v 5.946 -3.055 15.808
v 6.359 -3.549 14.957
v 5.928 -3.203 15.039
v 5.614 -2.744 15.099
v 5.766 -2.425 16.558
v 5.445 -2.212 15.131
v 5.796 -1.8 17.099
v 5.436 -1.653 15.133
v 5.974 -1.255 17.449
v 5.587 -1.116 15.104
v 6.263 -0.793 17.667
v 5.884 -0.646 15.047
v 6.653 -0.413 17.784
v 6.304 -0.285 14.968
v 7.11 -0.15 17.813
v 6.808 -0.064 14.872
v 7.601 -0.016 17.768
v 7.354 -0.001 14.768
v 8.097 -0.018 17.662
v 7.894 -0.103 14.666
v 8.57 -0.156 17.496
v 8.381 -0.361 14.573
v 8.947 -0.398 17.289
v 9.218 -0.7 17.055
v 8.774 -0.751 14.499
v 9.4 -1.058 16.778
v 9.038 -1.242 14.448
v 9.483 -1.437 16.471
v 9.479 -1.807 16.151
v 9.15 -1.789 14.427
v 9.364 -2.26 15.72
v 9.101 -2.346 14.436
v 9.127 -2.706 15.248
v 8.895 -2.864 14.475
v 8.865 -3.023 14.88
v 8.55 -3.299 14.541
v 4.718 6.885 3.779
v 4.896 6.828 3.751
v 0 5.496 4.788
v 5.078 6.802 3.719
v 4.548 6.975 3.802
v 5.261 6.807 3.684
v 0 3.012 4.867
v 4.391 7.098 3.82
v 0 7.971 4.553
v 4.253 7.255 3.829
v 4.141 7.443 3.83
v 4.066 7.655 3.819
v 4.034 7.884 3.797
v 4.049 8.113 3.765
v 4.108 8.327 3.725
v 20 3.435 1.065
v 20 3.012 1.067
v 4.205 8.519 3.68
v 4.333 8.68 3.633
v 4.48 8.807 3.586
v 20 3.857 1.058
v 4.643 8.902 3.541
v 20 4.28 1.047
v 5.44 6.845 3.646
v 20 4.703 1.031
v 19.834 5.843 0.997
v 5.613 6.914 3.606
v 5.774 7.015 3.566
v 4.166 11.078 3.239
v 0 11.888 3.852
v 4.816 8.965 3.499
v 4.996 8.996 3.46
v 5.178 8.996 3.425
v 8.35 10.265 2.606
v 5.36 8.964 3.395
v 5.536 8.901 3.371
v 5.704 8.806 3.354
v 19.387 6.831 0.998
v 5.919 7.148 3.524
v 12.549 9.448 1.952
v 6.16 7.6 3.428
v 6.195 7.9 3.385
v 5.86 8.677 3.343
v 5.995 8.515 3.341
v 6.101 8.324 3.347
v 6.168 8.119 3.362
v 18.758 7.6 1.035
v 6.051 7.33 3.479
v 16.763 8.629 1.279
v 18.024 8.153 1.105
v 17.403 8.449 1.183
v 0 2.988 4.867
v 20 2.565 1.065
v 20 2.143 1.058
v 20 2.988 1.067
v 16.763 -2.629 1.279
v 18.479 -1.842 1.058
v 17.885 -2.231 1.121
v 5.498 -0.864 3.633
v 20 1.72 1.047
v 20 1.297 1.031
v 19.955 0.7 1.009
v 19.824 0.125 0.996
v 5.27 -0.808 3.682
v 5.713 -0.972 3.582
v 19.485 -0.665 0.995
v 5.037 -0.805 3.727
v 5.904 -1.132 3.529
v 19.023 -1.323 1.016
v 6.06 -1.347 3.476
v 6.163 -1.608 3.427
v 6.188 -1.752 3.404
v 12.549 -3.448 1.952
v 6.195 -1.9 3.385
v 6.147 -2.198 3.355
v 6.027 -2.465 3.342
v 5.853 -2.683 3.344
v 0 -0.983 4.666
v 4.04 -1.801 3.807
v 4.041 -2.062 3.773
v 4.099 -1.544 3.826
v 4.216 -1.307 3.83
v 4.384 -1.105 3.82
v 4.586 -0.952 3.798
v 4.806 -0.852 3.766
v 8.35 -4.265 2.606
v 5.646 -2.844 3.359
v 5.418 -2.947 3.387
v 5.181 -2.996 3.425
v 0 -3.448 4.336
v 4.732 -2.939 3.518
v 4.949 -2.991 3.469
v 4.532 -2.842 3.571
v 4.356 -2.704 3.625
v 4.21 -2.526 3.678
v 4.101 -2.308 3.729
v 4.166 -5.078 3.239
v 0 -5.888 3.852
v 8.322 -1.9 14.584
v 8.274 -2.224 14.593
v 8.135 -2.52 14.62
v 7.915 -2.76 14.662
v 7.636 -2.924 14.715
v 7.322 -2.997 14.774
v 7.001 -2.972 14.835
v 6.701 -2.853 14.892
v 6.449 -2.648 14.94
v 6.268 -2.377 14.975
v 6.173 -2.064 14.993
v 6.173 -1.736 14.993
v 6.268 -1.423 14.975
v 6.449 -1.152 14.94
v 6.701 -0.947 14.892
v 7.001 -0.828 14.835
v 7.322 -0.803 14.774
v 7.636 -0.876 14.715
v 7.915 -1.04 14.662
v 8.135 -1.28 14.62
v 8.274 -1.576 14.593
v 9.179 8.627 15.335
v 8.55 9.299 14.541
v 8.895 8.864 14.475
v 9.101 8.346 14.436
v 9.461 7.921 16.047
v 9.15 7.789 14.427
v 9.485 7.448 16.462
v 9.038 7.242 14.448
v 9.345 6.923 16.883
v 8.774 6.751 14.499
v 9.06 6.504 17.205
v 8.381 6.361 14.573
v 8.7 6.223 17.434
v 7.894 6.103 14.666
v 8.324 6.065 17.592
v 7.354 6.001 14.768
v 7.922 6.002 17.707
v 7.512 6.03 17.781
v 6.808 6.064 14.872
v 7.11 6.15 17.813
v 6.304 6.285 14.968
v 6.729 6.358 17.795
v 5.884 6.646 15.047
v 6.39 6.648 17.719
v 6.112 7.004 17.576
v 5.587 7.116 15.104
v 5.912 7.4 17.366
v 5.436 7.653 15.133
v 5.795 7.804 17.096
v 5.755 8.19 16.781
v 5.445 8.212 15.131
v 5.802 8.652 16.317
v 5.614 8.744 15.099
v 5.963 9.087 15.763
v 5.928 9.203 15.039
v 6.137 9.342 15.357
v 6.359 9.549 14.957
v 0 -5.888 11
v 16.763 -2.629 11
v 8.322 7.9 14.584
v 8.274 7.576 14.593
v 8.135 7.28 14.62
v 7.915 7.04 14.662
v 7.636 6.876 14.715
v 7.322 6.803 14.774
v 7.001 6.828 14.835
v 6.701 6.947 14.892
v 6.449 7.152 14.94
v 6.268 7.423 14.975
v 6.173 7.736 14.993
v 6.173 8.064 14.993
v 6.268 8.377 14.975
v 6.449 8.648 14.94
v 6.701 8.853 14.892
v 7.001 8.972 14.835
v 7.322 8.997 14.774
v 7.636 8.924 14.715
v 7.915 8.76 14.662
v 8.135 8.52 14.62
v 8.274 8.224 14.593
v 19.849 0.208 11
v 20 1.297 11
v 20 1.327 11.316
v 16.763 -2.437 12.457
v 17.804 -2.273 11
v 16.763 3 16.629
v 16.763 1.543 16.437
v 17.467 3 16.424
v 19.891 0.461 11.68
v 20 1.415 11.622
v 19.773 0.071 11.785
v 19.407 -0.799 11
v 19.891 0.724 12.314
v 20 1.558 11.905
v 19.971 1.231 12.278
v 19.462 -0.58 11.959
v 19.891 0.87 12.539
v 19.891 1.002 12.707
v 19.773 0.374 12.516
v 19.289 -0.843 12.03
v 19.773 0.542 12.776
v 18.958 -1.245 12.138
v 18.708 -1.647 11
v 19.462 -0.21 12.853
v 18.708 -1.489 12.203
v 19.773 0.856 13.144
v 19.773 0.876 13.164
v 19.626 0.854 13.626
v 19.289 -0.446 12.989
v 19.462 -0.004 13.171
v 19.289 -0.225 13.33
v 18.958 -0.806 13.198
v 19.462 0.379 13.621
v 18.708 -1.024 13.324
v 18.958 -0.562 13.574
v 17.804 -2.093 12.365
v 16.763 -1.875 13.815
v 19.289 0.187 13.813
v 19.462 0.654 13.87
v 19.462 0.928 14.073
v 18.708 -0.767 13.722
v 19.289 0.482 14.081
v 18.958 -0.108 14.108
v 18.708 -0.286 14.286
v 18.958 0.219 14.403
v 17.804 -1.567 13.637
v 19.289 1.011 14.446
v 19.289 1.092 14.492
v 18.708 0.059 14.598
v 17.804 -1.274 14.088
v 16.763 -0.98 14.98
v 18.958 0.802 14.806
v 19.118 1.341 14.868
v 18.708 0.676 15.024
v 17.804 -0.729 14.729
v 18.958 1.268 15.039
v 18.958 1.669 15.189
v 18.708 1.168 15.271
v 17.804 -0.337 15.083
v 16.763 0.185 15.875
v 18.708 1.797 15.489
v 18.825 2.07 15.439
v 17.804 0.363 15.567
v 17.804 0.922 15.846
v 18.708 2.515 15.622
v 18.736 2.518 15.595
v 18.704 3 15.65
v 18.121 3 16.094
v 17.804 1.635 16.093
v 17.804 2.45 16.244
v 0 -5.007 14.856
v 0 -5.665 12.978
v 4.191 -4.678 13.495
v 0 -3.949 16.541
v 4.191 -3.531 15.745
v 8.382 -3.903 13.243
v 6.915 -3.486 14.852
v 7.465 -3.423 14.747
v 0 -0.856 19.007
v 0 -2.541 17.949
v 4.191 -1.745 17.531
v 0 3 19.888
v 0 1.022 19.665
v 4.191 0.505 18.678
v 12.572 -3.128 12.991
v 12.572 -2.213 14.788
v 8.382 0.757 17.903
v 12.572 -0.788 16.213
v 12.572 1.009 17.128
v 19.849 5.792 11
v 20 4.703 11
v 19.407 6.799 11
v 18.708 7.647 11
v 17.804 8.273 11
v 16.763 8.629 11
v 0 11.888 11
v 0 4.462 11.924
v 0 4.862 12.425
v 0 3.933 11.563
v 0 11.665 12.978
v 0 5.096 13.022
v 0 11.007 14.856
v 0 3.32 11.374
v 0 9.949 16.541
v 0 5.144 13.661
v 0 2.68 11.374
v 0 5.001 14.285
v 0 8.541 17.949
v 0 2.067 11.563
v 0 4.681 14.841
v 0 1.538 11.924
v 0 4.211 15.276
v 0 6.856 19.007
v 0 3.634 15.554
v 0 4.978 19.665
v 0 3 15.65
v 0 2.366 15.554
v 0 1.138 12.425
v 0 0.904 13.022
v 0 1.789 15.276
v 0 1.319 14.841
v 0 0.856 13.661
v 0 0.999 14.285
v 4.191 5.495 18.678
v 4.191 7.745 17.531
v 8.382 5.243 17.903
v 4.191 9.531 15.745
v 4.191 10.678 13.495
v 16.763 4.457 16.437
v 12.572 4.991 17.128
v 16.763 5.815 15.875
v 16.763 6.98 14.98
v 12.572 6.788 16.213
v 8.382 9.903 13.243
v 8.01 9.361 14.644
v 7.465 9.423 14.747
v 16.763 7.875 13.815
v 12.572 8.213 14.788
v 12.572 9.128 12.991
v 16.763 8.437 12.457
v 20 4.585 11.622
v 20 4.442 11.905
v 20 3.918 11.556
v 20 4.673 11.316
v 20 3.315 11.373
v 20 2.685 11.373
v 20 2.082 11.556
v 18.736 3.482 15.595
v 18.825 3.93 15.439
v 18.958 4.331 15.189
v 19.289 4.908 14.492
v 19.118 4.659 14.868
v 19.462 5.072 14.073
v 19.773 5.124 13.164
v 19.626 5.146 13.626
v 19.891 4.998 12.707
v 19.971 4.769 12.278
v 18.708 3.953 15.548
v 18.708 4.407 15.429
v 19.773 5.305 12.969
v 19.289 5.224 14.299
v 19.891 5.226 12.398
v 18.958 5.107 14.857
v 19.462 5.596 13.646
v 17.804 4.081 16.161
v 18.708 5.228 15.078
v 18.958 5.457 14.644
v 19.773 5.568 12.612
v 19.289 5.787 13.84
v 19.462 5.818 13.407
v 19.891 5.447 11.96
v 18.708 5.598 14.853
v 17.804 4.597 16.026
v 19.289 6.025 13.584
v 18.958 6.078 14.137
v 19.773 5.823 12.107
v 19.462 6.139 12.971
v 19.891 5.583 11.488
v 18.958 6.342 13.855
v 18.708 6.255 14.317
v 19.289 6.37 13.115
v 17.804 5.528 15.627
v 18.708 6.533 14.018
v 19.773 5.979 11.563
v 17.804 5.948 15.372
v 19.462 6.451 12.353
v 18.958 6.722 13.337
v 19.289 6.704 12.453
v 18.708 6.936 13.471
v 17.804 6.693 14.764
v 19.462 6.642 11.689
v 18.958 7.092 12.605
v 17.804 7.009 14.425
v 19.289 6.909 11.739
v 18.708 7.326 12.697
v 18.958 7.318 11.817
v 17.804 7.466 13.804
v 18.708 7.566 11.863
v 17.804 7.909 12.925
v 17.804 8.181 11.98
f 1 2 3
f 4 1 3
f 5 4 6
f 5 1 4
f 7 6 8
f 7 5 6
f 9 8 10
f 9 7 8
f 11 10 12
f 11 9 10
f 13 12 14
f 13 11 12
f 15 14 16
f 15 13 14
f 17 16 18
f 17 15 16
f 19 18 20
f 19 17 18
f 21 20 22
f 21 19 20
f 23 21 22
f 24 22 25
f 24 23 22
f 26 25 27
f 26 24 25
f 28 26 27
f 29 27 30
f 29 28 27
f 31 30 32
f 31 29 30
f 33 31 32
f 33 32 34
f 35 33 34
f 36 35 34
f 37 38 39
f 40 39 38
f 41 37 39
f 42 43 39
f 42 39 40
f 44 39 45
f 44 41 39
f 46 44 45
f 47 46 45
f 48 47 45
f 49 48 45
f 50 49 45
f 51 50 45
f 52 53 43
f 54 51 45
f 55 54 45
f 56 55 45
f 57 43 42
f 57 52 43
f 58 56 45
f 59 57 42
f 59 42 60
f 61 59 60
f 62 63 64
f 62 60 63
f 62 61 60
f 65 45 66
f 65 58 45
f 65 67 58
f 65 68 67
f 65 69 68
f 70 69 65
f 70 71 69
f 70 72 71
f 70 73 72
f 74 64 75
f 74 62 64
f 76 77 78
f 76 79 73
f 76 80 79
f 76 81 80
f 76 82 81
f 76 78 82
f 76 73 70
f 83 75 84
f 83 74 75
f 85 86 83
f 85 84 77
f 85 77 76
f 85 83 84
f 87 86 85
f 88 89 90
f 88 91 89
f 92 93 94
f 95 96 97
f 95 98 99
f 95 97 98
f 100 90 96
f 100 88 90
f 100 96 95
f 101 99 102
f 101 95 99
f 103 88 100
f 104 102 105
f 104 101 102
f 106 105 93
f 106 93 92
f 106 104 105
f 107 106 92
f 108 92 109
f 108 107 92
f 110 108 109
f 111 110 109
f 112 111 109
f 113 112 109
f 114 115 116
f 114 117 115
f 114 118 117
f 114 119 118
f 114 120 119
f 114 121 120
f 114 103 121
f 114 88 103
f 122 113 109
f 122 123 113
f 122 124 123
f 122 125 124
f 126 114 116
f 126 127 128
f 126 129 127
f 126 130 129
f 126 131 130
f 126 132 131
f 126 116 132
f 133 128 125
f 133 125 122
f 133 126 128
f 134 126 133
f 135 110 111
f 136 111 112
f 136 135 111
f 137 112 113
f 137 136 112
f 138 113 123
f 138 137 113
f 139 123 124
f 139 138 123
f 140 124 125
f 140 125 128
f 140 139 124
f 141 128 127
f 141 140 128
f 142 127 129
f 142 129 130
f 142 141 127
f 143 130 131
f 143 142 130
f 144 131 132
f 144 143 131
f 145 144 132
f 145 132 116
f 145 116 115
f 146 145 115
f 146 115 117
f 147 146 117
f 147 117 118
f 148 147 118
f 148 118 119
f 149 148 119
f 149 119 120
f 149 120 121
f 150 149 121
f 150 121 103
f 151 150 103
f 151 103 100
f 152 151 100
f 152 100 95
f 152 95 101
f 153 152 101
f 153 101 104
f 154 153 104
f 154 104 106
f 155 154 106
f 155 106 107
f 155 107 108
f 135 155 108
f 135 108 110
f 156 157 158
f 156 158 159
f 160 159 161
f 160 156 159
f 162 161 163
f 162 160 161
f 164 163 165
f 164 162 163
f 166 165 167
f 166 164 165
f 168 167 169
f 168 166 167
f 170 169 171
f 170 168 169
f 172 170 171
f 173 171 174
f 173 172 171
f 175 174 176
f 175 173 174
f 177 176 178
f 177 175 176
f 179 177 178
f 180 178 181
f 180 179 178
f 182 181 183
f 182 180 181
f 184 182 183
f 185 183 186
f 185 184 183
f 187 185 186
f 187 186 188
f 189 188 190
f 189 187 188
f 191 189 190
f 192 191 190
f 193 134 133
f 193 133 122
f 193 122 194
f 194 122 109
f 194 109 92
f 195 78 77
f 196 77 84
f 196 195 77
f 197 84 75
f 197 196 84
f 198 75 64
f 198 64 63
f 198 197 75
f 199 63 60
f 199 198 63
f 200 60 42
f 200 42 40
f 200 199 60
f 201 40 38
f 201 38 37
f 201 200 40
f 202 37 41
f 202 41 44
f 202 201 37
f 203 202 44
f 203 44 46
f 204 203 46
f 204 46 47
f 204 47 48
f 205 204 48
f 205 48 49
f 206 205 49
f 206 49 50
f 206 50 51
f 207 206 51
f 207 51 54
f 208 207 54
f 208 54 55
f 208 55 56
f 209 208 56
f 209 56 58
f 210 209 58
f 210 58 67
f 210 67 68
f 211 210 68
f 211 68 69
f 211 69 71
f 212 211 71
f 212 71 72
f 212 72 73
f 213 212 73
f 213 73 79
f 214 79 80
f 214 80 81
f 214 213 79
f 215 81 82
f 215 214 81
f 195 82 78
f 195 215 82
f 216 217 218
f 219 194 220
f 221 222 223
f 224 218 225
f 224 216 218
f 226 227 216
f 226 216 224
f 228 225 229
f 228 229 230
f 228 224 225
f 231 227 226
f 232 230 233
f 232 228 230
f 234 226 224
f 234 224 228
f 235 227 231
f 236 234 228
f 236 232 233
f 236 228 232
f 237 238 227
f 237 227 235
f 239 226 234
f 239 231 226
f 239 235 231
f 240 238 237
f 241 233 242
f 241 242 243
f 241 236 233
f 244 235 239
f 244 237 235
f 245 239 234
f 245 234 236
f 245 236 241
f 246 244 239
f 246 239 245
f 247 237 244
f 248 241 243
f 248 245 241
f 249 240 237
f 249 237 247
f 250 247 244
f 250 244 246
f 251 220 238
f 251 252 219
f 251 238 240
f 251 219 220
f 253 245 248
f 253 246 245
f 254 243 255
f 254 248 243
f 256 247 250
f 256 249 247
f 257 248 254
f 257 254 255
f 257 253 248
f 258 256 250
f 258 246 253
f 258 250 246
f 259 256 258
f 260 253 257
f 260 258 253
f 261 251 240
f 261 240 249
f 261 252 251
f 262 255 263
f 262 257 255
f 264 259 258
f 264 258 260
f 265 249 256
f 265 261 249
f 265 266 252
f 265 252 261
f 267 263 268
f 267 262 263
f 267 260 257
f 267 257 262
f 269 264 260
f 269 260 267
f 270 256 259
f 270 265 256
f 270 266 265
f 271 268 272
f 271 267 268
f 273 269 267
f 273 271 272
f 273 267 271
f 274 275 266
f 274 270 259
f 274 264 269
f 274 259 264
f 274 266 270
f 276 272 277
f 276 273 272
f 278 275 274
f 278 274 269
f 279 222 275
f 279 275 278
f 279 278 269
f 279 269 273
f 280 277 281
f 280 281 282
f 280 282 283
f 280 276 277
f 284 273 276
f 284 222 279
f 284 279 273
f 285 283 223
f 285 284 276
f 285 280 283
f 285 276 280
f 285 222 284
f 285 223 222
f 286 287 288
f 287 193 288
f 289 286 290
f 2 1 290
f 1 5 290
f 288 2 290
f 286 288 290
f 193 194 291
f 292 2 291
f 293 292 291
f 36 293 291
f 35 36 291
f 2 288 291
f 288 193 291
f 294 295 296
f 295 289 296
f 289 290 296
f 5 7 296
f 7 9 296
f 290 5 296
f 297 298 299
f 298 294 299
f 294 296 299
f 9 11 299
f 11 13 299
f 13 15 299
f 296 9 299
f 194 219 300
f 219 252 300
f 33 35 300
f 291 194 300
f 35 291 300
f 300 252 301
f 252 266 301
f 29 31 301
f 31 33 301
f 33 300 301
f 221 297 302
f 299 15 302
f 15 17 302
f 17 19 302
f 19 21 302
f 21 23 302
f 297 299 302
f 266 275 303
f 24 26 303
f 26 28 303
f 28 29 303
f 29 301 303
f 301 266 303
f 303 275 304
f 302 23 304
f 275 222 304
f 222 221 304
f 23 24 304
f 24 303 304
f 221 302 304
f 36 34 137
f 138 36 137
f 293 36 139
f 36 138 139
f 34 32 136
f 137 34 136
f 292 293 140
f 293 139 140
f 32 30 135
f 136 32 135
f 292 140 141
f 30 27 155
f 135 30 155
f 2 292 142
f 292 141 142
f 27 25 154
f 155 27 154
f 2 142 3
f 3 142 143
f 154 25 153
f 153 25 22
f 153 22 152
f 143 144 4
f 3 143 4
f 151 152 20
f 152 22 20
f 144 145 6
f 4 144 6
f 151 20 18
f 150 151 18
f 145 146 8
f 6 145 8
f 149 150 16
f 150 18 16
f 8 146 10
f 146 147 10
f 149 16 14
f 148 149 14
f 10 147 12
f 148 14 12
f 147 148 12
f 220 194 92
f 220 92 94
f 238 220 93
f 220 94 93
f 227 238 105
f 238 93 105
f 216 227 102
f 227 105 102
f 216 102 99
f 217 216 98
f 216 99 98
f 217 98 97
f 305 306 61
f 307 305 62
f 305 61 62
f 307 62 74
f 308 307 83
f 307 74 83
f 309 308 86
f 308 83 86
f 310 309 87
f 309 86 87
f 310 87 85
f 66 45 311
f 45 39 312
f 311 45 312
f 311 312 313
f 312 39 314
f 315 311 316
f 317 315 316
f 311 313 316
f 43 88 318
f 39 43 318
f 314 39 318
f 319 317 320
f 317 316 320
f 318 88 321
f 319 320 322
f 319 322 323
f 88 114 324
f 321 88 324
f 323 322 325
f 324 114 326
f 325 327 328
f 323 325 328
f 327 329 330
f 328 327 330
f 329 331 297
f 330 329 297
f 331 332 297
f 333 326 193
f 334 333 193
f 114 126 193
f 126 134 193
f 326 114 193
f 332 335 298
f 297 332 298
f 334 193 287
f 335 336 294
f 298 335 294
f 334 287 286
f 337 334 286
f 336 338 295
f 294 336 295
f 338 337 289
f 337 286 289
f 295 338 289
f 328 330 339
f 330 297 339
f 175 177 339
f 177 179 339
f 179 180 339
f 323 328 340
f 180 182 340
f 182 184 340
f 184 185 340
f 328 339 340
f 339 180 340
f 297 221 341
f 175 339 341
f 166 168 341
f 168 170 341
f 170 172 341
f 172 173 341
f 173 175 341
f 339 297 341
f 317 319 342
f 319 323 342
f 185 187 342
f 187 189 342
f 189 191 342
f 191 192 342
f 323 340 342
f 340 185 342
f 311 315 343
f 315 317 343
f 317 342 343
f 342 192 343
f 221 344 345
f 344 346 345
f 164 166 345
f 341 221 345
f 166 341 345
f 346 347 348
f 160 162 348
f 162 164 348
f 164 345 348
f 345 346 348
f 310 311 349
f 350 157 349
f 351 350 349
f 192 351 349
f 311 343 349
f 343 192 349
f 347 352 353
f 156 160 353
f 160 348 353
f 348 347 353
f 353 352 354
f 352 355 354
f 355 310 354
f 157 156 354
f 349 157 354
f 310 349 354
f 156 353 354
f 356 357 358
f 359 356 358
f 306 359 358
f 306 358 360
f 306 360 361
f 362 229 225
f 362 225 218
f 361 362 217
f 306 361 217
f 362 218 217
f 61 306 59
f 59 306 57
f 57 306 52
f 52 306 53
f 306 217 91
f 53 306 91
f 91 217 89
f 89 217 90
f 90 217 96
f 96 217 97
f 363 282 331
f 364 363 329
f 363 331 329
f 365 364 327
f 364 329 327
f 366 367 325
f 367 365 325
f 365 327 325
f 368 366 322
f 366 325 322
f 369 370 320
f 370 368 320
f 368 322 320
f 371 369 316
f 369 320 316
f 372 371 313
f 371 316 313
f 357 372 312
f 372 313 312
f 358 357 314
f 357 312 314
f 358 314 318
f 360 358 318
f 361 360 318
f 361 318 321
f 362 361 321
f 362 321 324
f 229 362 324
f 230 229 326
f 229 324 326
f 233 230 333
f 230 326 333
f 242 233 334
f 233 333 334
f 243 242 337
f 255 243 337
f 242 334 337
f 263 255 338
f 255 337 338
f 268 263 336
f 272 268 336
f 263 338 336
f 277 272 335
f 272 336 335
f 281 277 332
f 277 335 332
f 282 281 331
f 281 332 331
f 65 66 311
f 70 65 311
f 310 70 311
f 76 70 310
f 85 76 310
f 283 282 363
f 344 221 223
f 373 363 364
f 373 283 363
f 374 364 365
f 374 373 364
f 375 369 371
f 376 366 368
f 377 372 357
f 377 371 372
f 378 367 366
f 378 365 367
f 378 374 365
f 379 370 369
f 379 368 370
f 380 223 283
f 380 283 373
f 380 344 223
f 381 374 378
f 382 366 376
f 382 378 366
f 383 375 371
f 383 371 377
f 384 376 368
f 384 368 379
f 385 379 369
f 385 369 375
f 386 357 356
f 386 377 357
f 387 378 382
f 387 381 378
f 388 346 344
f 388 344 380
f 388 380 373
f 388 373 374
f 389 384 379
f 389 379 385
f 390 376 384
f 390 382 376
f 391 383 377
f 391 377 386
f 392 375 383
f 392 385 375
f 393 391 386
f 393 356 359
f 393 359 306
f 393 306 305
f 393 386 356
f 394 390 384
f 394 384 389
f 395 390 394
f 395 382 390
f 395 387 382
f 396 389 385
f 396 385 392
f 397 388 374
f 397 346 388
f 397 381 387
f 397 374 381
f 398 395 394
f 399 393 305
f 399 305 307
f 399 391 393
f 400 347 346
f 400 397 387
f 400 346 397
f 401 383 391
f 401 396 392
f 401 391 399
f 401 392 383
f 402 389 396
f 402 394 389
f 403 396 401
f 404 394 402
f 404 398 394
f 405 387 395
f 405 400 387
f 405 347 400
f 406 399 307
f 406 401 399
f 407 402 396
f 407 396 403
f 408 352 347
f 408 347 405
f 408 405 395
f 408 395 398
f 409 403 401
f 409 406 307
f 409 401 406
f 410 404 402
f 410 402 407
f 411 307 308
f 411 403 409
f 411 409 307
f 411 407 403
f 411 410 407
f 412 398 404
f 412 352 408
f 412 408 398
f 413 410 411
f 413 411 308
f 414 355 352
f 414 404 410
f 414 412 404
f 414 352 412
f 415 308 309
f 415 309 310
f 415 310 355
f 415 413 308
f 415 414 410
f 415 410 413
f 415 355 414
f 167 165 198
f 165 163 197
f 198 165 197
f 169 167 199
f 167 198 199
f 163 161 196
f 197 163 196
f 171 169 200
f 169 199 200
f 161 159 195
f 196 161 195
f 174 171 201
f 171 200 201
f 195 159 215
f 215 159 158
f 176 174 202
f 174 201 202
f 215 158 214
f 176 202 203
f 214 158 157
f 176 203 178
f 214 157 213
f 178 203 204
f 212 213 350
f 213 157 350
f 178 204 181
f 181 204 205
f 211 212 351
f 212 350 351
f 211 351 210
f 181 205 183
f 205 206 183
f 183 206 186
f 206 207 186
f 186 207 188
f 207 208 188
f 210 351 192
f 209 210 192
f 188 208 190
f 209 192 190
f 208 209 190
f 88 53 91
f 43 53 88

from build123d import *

# Parameters (mm, degrees)
ESQUISSE1_W                  = 20
ESQUISSE1_H                  = 18
BOSS_EXTRU_1_DEPTH           = 20
ENL_V_MAT_EXTRU_1_DEPTH      = 34.526109228
ENL_V_MAT_EXTRU_1_DEPTH_BACK = 34.526109228
ESQUISSE4_W                  = 23.372047651
ESQUISSE4_H                  = 17.8
ENL_V_MAT_EXTRU_3_DEPTH      = 1
CONG_2_R                     = 40
ESQUISSE5_R                  = 2.15
ENL_V_MAT_EXTRU_4_DEPTH      = 31.724582991
CONG_3_R                     = 9
CHANFREIN1_SIZE              = 20.578216064
CHANFREIN1_SIZE_2            = 4
CONG_4_R                     = 4
ESQUISSE6_R                  = 1.1
ENL_V_MAT_EXTRU_5_DEPTH      = 253.375332695
ESQUISSE10_R                 = 1.9
ENL_V_MAT_EXTRU_6_DEPTH      = 7.5


# Some blends are built 0.0001 mm under size
with BuildPart() as part:
    # Esquisse1 → Boss.-Extru.1 (new body)
    with BuildSketch(Plane.XY):
        with Locations((10, 3)):
            Rectangle(ESQUISSE1_W, ESQUISSE1_H)
    extrude(amount=BOSS_EXTRU_1_DEPTH)

    # Esquisse2 → Enlèv. mat.-Extru.1 (cut, two sides: drawn at the far end of the back side and taken through both)
    with BuildSketch(Plane(origin=(0, 12, 0), x_dir=(1, 0, 0), z_dir=(0, 1, 0)).offset(-ENL_V_MAT_EXTRU_1_DEPTH_BACK)):
        Polygon((85.451214086, 12.384445057), (20.045630921, -0.0408989), (0, -3.849042594), (0, 0), (0, 66.575366927), (71.310016401, 179.020907021), (156.761230487, 124.829985151), align=None)
    extrude(amount=ENL_V_MAT_EXTRU_1_DEPTH + ENL_V_MAT_EXTRU_1_DEPTH_BACK, mode=Mode.SUBTRACT)

    # Esquisse4 → Enlèv. mat.-Extru.3 (cut)
    with BuildSketch(Plane(origin=(0.705746644, 0, 3.714969257), x_dir=(-0.9824291803850712, 0, 0.1866357562952965), z_dir=(-0.1866357562952965, 0, -0.9824291803850712))):
        with Locations((-7.953308699, 3)):
            Rectangle(ESQUISSE4_W, ESQUISSE4_H)
    extrude(amount=-ENL_V_MAT_EXTRU_3_DEPTH, mode=Mode.SUBTRACT)

    # Congé2
    # the kernel refuses this fillet: 40 mm, written as the material it adds along each edge
    with BuildSketch(Plane(origin=(41.830053891, 11.9, -3.079684565), x_dir=(0, -1, 0), z_dir=(-0.9824291803850712, 0, 0.1866357562952965))) as cong_2_piece_1_section:
        with BuildLine():
            CenterArc((8.888194417, -40), CONG_2_R, 90, 12.838568141)
            Line((0, -1), (0, 0))
            Line((0, 0), (8.888194417, 0))
        make_face()
    cong_2_piece_1 = extrude(amount=64.798673587, mode=Mode.PRIVATE)
    cong_2_piece_1 = split(cong_2_piece_1, bisect_by=Plane(origin=(20, 11.9, -3.079684565), z_dir=(-1, 0, 0)), keep=Keep.TOP, mode=Mode.PRIVATE)
    cong_2_piece_1 = split(cong_2_piece_1, bisect_by=Plane(origin=(0, 11.9, -3.079684565), z_dir=(1, 0, 0)), keep=Keep.TOP, mode=Mode.PRIVATE)
    add(cong_2_piece_1)
    with BuildSketch(Plane(origin=(-21.830053891, -5.9, 9.014064887), x_dir=(-0.18663575629529652, 1.7763568394002434e-15, -0.9824291803850713), z_dir=(0.9824291803850712, 0, -0.1866357562952965))) as cong_2_piece_2_section:
        with BuildLine():
            CenterArc((40, 8.888194417), CONG_2_R, 180, 12.838568141)
            Line((0, 8.888194417), (0, 0))
            Line((0, 0), (1, 0))
        make_face()
    cong_2_piece_2 = extrude(amount=64.798673587, mode=Mode.PRIVATE)
    cong_2_piece_2 = split(cong_2_piece_2, bisect_by=Plane(origin=(20, -5.9, 9.014064887), z_dir=(-1, 0, 0)), keep=Keep.TOP, mode=Mode.PRIVATE)
    cong_2_piece_2 = split(cong_2_piece_2, bisect_by=Plane(origin=(0, -5.9, 9.014064887), z_dir=(1, 0, 0)), keep=Keep.TOP, mode=Mode.PRIVATE)
    add(cong_2_piece_2)

    # Esquisse5 → Enlèv. mat.-Extru.4 (cut, through all)
    with BuildSketch(Plane.ZY):
        with Locations((13.5, 3)):
            Circle(ESQUISSE5_R)
    extrude(amount=-ENL_V_MAT_EXTRU_4_DEPTH, mode=Mode.SUBTRACT)

    # Congé3
    cong_3_edges = [part.edges().sort_by_distance(p)[0] for p in [
        (10, 12, 20),
        (10, -6, 20),
    ]]
    fillet(cong_3_edges, radius=CONG_3_R - 0.0001)  # a hair under: the kernel refuses the full size

    # Chanfrein1
    # the kernel refuses this chamfer: 20.578216064, 4 mm, written as the material it takes off along each edge
    with BuildSketch(Plane(origin=(20, -6, -53.417428004), x_dir=(-1, 0, 0), z_dir=(0, 0, 1))) as chanfrein1_piece_1:
        Polygon((CHANFREIN1_SIZE, 0), (0, -CHANFREIN1_SIZE_2), (0, 0), align=None)
    extrude(amount=64.417528004, mode=Mode.SUBTRACT)
    with BuildSketch(Plane(origin=(20, 2.9999, 11.0001), x_dir=(0, -1, 0), z_dir=(0, 0, -1))) as chanfrein1_piece_2:
        Polygon((8.9999, CHANFREIN1_SIZE), (8.9999 - CHANFREIN1_SIZE_2, 0), (8.9999, 0), align=None)
    revolve(axis=Axis((20, 2.9999, 11.0001), (-1, 0, 0)), revolution_arc=90, mode=Mode.SUBTRACT)
    with BuildSketch(Plane(origin=(20, 3.0001, 11.0001), x_dir=(0, 0, 1), z_dir=(0, -1, 0))) as chanfrein1_piece_3:
        Polygon((8.9999, CHANFREIN1_SIZE), (8.9999 - CHANFREIN1_SIZE_2, 0), (8.9999, 0), align=None)
    revolve(axis=Axis((20, 3.0001, 11.0001), (-1, 0, 0)), revolution_arc=90, mode=Mode.SUBTRACT)
    with BuildSketch(Plane(origin=(20, 12, -53.417428004), x_dir=(-1, 0, 0), z_dir=(0, 0, 1))) as chanfrein1_piece_4:
        Polygon((CHANFREIN1_SIZE, 0), (0, CHANFREIN1_SIZE_2), (0, 0), align=None)
    extrude(amount=64.417528004, mode=Mode.SUBTRACT)
    with BuildSketch(Plane(origin=(20, 2.9999, 20), x_dir=(-1, 0, 0), z_dir=(0, 1, 0))) as chanfrein1_piece_5:
        Polygon((CHANFREIN1_SIZE, 0), (0, -CHANFREIN1_SIZE_2), (0, 0), align=None)
    extrude(amount=0.0002, mode=Mode.SUBTRACT)

    # Congé4
    # the kernel refuses this fillet: 4 mm, written as the material it takes off along each edge
    with BuildSketch(Plane(origin=(20, -2, -7.493740481), x_dir=(-0.9816271834478703, -0.19080899537548365, 0), z_dir=(0, 0, 1))) as cong_4_piece_1:
        with BuildLine():
            CenterArc((CONG_4_R * 0.824336385818, -CONG_4_R), CONG_4_R, 90, 79)
            Line((-CONG_4_R * 0.157290797629, -CONG_4_R * 0.809191004625), (0, 0))
            Line((0, 0), (CONG_4_R * 0.824336385818, 0))
        make_face()
    extrude(amount=18.493840481, mode=Mode.SUBTRACT)
    with BuildSketch(Plane(origin=(20, 2.9999, 11.0001), x_dir=(0, -1, 0), z_dir=(0, 0, -1))) as cong_4_piece_2:
        with BuildLine():
            CenterArc((4.9999 - CONG_4_R * 0.824336385818, CONG_4_R), CONG_4_R, 270, 79)
            Line((4.9999 - CONG_4_R * 0.824336385818, 0), (4.9999, 0))
            Line((4.9999, 0), (4.9999 + CONG_4_R * 0.157290797629, CONG_4_R * 0.809191004625))
        make_face()
    revolve(axis=Axis((20, 2.9999, 11.0001), (-1, 0, 0)), revolution_arc=90, mode=Mode.SUBTRACT)
    with BuildSketch(Plane(origin=(20, 3.0001, 11.0001), x_dir=(0, 0, 1), z_dir=(0, -1, 0))) as cong_4_piece_3:
        with BuildLine():
            CenterArc((4.9999 - CONG_4_R * 0.824336385818, CONG_4_R), CONG_4_R, 270, 79)
            Line((4.9999 - CONG_4_R * 0.824336385818, 0), (4.9999, 0))
            Line((4.9999, 0), (4.9999 + CONG_4_R * 0.157290797629, CONG_4_R * 0.809191004625))
        make_face()
    revolve(axis=Axis((20, 3.0001, 11.0001), (-1, 0, 0)), revolution_arc=90, mode=Mode.SUBTRACT)
    with BuildSketch(Plane(origin=(20, 8, -7.493740481), x_dir=(-0.9816271834478704, 0.19080899537548335, 0), z_dir=(0, 0, 1))) as cong_4_piece_4:
        with BuildLine():
            CenterArc((CONG_4_R * 0.824336385818, CONG_4_R), CONG_4_R, 191, 79)
            Line((-CONG_4_R * 0.157290797629, CONG_4_R * 0.809191004625), (0, 0))
            Line((0, 0), (CONG_4_R * 0.824336385818, 0))
        make_face()
    extrude(amount=18.493840481, mode=Mode.SUBTRACT)
    with BuildSketch(Plane(origin=(20, 2.9999, 16), x_dir=(-0.9816271834478704, 0, 0.19080899537548315), z_dir=(0, 1, 0))) as cong_4_piece_5:
        with BuildLine():
            CenterArc((CONG_4_R * 0.824336385818, -CONG_4_R), CONG_4_R, 90, 79)
            Line((-CONG_4_R * 0.157290797629, -CONG_4_R * 0.809191004625), (0, 0))
            Line((0, 0), (CONG_4_R * 0.824336385818, 0))
        make_face()
    extrude(amount=0.0002, mode=Mode.SUBTRACT)

    # Esquisse6 → Enlèv. mat.-Extru.5 (cut, through all)
    with BuildSketch(Plane(origin=(248.354172881, 0, -23.381298734), x_dir=(-0.9824291803850712, 0, 0.1866357562952965), z_dir=(-0.1866357562952965, 0, -0.9824291803850712))):
        with Locations(Location((244, 7.9, 0), (0, 0, 180))):
            Circle(ESQUISSE6_R)
        with Locations(Location((244, -1.9, 0), (0, 0, 180))):
            Circle(ESQUISSE6_R)
    extrude(amount=ENL_V_MAT_EXTRU_5_DEPTH, mode=Mode.SUBTRACT)

    # Esquisse10 → Enlèv. mat.-Extru.6 (cut)
    with BuildSketch(Plane(origin=(4.363786372, 0, 22.970470151), x_dir=(-0.9824291803850712, 0, 0.1866357562952965), z_dir=(-0.1866357562952965, 0, -0.9824291803850712))):
        with Locations((-4.4, 7.9)):
            Circle(ESQUISSE10_R)
        with Locations((-4.4, -1.9)):
            Circle(ESQUISSE10_R)
    extrude(amount=ENL_V_MAT_EXTRU_6_DEPTH, mode=Mode.SUBTRACT)


solid = part.part
